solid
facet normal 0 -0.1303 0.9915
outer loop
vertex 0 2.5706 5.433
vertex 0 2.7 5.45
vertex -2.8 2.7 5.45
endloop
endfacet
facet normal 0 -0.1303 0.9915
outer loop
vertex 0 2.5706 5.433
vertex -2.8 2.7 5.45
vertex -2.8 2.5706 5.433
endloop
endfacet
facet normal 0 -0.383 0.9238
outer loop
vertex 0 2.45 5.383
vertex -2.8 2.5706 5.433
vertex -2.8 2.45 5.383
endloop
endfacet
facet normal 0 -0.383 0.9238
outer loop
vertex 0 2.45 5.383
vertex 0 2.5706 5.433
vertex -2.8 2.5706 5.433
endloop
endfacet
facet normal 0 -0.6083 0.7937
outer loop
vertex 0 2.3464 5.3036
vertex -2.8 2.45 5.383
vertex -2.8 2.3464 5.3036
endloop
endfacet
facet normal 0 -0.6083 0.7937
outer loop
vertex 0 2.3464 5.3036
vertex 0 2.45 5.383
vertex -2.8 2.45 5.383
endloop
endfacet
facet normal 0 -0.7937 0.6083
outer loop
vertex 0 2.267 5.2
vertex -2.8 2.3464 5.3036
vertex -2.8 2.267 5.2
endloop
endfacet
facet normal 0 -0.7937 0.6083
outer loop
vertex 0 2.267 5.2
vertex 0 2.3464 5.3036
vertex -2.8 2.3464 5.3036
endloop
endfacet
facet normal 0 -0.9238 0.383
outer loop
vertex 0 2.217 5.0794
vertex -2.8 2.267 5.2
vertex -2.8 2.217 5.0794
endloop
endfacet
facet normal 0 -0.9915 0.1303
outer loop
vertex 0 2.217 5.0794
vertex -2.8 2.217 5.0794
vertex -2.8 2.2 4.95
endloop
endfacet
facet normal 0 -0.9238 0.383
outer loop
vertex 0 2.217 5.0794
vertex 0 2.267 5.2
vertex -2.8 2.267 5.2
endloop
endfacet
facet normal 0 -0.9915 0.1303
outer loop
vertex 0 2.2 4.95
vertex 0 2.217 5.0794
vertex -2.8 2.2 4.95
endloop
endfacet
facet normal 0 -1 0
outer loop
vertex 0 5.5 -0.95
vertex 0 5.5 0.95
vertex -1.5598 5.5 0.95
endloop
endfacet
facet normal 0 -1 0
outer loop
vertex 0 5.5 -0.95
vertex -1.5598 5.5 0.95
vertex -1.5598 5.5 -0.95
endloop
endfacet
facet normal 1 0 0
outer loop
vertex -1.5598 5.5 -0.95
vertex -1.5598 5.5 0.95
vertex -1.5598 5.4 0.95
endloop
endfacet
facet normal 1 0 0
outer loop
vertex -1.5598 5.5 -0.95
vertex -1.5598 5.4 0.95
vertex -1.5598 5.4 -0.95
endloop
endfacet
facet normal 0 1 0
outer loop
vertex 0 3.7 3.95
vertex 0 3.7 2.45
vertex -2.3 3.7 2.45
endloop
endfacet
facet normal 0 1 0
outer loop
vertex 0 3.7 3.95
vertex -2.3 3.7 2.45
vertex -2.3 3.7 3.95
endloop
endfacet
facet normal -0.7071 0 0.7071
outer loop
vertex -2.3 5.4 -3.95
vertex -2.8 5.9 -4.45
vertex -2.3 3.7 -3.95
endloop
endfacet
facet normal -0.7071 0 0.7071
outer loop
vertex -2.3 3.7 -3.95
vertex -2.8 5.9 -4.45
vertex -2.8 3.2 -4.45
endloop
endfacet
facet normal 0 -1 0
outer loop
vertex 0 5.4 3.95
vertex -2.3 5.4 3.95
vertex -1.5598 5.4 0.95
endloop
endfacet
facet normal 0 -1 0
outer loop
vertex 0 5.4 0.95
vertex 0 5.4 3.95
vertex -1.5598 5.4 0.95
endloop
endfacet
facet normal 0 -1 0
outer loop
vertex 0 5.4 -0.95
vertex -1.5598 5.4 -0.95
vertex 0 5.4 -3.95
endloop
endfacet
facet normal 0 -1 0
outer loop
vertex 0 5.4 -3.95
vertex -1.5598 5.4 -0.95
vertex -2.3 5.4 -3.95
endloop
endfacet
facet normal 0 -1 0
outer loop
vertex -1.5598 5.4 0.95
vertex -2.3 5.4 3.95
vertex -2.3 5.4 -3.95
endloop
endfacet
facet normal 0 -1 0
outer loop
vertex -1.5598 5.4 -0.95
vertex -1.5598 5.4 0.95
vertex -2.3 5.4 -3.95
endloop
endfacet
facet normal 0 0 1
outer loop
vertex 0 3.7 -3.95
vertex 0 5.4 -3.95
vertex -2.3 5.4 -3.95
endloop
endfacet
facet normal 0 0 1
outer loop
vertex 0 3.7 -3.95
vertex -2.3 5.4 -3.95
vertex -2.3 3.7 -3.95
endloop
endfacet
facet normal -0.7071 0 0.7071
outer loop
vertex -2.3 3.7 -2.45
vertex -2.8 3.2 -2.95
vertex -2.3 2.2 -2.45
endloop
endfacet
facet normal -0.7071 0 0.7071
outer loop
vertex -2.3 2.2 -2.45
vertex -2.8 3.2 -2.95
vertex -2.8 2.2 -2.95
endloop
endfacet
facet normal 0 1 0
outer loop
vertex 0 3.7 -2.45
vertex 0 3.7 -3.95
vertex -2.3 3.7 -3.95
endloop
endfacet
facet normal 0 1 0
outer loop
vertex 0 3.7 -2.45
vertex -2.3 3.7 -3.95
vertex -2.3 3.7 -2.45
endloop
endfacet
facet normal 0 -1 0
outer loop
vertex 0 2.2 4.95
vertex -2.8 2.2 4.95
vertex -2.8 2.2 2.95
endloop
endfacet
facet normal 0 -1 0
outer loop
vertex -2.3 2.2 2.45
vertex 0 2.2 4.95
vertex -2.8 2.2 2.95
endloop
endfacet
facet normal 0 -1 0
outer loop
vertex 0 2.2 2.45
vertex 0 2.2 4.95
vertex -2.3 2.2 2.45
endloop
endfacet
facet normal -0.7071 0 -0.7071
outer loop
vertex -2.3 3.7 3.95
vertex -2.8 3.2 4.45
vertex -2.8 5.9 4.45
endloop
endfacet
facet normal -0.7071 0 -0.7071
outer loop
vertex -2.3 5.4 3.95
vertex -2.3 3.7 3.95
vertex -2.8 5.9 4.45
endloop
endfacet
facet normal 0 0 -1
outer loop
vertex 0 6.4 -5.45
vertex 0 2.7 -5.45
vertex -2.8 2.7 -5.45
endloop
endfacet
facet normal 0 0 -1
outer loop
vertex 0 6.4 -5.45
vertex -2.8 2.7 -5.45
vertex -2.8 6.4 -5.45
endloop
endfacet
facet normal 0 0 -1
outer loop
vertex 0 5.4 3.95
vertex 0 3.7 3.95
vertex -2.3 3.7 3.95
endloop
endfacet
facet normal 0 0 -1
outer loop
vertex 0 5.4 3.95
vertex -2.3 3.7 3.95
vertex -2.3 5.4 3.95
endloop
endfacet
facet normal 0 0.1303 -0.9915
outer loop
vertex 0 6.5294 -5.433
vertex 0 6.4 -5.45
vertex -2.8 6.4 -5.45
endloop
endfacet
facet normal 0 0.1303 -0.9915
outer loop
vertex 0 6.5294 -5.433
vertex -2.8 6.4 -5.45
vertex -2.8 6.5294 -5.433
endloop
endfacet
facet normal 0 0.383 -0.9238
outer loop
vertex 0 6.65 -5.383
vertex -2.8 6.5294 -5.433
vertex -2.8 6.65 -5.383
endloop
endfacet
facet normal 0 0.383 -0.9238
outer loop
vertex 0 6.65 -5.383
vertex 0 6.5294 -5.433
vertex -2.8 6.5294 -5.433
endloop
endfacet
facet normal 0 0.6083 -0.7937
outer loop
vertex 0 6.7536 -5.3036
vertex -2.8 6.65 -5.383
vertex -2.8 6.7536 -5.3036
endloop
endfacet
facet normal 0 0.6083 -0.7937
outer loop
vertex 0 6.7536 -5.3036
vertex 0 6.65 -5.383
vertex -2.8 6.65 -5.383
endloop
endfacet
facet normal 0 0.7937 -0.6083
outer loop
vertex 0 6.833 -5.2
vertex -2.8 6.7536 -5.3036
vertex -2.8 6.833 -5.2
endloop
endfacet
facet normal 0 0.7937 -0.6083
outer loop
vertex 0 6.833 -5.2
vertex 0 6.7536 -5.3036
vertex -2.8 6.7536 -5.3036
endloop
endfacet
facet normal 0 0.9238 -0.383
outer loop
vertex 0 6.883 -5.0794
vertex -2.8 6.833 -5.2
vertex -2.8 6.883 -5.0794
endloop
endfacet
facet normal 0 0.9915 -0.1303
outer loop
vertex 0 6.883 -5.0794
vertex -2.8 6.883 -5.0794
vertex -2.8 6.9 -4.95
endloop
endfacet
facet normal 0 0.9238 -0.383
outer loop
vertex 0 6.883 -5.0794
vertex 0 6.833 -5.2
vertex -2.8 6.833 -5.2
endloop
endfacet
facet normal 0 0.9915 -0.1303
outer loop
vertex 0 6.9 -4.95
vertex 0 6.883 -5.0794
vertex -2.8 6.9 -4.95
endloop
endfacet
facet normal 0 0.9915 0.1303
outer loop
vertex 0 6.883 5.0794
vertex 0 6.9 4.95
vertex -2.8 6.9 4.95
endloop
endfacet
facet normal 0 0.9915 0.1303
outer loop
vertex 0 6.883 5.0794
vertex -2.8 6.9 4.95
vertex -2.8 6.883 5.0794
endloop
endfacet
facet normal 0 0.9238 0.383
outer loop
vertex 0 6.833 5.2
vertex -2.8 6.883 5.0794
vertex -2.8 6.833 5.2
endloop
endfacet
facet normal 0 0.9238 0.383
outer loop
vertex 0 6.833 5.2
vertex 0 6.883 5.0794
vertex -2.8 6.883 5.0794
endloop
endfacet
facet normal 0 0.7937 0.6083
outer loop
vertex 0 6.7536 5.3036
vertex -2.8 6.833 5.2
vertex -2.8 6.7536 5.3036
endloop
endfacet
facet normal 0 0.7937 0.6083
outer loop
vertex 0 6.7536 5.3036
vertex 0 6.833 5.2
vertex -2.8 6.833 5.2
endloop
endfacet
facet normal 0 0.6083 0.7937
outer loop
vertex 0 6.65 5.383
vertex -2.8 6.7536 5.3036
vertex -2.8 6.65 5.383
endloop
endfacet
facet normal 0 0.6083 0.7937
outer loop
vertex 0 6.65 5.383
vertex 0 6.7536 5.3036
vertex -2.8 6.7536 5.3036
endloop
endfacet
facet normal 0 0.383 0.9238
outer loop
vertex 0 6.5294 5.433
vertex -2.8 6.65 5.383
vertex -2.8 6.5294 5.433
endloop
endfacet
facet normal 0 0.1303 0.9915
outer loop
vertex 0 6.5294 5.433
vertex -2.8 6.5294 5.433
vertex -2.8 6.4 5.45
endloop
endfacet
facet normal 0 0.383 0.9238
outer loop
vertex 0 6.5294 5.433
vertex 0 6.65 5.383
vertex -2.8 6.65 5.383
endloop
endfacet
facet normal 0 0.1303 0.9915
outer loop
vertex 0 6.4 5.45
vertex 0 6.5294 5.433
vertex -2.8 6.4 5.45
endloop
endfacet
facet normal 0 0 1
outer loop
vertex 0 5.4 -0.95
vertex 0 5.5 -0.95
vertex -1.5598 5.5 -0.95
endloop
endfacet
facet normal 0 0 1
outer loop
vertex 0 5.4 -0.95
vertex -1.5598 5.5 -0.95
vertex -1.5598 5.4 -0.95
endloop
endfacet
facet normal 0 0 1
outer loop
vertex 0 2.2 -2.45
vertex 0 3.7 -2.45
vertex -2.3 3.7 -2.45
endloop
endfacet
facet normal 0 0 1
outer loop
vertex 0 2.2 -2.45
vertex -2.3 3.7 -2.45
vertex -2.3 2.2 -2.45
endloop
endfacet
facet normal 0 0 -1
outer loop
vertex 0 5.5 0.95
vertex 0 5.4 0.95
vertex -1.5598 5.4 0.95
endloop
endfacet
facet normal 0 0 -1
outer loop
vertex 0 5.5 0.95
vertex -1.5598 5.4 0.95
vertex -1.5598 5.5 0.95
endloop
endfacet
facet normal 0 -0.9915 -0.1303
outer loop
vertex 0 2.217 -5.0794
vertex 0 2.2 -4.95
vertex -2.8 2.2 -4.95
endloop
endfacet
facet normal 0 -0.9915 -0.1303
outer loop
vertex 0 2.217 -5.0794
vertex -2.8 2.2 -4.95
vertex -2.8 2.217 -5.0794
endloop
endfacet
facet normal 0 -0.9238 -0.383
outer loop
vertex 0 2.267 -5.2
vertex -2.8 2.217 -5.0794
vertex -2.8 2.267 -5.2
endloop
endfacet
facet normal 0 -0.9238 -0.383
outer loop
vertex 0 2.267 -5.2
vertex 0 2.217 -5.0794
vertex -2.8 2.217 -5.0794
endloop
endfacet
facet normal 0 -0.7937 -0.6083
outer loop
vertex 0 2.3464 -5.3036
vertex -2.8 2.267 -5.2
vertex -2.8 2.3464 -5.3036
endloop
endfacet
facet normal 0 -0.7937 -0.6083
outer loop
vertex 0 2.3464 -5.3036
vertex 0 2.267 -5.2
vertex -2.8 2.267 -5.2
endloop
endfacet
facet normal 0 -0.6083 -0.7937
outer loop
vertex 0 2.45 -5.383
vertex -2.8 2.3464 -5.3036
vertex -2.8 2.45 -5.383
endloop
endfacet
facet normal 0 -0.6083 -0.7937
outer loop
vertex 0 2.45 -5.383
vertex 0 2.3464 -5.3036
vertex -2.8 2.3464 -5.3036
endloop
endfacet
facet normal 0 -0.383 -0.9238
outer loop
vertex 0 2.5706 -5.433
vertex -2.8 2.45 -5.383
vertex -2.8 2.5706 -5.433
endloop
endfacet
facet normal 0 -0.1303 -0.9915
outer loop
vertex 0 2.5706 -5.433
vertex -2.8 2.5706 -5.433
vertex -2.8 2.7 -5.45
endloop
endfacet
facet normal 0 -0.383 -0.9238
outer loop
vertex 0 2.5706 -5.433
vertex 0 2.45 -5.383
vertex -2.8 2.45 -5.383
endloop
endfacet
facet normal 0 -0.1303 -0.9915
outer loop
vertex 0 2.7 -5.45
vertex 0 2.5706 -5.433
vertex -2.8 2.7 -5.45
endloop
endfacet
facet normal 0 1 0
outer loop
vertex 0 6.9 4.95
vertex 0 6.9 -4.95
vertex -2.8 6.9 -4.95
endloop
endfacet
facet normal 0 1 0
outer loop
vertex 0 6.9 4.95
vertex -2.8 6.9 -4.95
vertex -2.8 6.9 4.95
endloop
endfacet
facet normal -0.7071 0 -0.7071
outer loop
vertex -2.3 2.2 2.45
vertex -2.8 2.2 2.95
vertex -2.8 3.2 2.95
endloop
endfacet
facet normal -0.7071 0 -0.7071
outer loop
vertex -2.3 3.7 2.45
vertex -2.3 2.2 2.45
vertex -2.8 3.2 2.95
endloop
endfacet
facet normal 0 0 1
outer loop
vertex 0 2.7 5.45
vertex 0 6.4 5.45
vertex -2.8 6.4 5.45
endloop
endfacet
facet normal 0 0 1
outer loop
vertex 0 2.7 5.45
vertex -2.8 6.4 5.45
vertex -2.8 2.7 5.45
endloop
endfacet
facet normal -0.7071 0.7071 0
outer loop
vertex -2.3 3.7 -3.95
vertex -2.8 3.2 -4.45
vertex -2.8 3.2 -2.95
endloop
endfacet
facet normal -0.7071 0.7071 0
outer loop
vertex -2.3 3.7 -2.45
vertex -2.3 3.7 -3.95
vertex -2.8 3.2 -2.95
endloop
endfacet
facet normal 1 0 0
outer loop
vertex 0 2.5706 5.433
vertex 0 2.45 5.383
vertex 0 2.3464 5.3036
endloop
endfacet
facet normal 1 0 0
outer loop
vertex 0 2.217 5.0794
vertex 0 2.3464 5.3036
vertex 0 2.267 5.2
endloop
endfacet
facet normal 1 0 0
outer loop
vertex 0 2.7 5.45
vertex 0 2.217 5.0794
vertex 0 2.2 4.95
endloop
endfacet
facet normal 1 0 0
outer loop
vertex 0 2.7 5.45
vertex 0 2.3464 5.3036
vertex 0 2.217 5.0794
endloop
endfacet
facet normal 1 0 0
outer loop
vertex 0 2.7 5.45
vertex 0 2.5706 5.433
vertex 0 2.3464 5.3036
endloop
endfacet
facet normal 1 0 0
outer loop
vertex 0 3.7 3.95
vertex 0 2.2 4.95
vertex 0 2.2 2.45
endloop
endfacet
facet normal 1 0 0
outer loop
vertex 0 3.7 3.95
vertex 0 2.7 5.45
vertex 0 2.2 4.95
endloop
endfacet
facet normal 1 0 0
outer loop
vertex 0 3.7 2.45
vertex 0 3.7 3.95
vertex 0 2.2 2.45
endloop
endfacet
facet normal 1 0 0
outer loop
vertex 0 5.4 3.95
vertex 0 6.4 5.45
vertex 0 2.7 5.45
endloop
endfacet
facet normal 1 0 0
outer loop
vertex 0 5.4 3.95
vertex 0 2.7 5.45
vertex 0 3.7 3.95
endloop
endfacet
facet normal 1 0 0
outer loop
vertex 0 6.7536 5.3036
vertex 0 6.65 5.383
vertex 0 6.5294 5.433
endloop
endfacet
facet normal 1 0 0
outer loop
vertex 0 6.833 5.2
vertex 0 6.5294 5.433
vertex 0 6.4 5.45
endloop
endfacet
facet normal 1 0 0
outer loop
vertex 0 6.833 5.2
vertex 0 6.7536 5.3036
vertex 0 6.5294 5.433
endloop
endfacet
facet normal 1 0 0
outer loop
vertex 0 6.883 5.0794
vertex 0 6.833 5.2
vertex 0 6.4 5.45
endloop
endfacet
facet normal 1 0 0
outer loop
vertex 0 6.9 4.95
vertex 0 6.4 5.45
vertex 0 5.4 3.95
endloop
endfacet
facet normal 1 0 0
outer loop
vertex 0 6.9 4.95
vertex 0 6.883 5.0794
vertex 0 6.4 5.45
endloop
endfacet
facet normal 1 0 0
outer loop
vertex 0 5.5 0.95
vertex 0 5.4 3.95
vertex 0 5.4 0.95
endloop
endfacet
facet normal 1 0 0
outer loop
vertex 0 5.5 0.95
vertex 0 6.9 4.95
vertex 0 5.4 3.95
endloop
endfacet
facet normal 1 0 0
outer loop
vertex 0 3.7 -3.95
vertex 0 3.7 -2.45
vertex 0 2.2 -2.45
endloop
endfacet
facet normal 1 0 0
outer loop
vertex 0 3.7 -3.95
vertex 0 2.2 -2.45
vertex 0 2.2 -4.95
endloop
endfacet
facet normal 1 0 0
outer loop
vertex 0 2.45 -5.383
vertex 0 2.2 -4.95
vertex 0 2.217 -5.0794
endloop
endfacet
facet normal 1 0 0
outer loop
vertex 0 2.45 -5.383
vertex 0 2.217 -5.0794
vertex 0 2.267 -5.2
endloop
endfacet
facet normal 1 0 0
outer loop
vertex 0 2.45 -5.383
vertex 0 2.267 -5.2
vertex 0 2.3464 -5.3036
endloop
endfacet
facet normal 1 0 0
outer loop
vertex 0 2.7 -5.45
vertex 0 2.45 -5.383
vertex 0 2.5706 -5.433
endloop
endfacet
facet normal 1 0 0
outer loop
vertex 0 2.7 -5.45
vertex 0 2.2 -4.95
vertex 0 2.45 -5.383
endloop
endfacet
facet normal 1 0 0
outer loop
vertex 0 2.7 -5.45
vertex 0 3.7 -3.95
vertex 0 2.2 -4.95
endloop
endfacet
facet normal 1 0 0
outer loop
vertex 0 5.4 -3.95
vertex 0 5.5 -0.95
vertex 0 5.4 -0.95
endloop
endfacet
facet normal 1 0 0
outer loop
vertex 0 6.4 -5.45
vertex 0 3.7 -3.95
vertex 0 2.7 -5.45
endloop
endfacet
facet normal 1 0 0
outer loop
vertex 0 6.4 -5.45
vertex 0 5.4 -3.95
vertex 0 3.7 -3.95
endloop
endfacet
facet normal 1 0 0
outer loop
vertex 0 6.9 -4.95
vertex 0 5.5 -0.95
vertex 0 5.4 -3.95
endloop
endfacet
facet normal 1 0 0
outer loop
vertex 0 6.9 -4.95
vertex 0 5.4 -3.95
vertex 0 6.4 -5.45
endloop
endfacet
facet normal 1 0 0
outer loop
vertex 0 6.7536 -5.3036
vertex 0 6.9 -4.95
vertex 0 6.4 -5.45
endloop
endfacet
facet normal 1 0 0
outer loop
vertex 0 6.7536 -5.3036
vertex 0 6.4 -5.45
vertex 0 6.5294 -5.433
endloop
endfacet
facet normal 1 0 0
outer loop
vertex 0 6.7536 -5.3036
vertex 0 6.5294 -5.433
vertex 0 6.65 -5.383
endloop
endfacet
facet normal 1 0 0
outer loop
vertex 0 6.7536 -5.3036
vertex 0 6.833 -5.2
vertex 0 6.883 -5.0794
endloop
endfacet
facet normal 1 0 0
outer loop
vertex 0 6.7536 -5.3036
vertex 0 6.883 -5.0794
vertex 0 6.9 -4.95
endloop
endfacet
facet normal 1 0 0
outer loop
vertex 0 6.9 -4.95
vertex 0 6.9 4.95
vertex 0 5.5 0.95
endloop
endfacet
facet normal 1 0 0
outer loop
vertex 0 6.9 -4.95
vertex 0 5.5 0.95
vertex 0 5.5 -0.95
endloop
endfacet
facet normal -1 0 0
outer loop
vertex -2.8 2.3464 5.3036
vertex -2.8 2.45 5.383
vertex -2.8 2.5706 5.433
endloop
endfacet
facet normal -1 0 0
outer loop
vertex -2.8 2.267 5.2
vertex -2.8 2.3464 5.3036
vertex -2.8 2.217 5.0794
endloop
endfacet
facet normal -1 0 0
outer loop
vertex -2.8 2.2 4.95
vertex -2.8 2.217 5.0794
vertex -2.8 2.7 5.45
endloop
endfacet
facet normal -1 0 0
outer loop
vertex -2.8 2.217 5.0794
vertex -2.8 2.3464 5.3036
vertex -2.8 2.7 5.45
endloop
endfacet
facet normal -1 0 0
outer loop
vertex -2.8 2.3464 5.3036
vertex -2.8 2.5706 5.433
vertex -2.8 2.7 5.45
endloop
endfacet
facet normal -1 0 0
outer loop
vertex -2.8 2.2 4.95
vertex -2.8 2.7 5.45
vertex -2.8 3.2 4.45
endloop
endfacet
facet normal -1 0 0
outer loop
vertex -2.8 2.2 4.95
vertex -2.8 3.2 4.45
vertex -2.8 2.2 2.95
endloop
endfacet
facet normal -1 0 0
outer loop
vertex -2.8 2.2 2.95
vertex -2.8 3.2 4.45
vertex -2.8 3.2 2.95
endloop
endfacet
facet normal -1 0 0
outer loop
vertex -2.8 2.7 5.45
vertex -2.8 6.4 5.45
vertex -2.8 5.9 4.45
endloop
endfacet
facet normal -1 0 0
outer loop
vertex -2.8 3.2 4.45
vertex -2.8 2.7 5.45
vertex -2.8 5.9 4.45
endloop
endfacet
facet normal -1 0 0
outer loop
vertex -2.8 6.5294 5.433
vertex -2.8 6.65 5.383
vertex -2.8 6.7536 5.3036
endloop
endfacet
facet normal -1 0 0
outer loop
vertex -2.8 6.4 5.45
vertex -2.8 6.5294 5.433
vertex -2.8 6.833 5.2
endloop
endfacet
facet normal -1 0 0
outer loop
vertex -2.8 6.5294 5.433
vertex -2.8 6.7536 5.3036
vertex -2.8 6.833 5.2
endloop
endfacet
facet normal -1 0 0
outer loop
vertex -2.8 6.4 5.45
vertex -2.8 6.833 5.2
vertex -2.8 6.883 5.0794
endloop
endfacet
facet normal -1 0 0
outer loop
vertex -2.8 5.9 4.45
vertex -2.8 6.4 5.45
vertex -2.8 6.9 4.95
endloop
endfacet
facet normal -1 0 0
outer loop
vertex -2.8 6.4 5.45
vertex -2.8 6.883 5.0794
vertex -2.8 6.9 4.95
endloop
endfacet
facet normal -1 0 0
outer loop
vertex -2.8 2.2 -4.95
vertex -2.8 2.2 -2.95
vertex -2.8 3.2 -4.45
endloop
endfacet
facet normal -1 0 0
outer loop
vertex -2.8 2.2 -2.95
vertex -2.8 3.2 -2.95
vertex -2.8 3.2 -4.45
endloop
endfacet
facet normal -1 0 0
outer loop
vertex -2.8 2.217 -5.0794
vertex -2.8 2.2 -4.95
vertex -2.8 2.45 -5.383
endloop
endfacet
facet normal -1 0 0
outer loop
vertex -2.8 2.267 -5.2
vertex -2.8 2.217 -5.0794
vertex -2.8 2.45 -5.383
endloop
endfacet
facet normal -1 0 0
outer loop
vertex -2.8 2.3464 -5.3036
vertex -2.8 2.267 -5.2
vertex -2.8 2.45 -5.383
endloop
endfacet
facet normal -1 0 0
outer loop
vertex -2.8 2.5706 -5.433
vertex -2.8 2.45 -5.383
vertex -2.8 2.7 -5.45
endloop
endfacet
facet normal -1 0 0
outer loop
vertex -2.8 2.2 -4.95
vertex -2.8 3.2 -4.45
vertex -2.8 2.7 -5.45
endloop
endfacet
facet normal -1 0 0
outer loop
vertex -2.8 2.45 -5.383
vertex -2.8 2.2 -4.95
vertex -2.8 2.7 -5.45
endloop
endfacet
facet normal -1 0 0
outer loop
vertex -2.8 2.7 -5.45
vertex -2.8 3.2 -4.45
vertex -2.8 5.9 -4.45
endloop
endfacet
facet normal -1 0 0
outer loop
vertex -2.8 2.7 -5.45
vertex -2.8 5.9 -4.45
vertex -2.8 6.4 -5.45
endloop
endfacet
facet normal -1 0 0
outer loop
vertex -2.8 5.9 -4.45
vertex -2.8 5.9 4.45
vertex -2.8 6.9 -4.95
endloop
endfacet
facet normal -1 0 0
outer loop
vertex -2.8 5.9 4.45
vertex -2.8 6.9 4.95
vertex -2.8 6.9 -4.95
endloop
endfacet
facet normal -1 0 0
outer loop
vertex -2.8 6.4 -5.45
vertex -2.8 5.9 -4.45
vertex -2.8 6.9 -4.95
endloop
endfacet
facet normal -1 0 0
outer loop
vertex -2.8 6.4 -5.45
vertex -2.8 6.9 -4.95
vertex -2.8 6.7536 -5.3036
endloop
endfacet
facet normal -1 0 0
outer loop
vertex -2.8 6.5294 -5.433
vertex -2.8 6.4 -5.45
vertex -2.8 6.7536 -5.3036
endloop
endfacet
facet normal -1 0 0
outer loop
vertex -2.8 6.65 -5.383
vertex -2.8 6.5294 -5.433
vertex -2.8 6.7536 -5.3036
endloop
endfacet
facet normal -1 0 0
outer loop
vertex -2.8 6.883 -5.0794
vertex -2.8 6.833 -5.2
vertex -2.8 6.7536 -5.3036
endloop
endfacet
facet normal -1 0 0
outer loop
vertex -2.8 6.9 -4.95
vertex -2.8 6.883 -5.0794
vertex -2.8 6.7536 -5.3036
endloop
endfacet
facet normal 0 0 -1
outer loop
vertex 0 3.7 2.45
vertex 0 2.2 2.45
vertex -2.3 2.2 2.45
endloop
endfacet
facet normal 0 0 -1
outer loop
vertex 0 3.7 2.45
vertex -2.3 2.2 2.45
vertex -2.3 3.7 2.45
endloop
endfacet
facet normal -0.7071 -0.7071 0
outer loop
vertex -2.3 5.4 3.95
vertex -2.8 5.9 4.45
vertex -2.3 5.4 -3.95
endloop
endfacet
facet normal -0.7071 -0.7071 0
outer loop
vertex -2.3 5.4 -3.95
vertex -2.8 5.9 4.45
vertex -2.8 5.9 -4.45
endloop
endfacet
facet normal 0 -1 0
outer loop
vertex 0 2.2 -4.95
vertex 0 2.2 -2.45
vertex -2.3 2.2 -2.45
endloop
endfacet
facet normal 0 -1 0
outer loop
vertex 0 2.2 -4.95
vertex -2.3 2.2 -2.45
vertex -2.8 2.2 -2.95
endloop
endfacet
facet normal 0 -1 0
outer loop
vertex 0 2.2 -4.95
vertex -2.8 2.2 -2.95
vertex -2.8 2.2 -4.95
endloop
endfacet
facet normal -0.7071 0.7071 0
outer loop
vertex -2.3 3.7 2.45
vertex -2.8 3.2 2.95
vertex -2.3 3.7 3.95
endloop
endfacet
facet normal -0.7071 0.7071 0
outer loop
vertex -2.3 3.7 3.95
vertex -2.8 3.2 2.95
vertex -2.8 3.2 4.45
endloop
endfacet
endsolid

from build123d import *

# Parameters (mm, degrees)
BOSS_EXTRUDE_CLIP_DEPTH       = 2.8
BOSS_EXTRUDE_START            = -2.8
CLIP_OUTLINE_3_W              = 1.9
CLIP_OUTLINE_3_H              = 0.1
BOSS_EXTRUDE_CLIP_NOTCH_DEPTH = 1.240192379
CHAMFER_CLIP_SIZE             = 0.5


with BuildPart() as part:
    # Clip outline → Boss-Extrude clip (new body)
    with BuildSketch(Plane(origin=(0, 0, 0), x_dir=(0, 0, -1), z_dir=(1, 0, 0))):
        with BuildLine():
            Line((-4.95, 2.2), (-2.45, 2.2))
            Line((-2.45, 2.2), (-2.45, 3.7))
            Line((-2.45, 3.7), (-3.95, 3.7))
            Line((-3.95, 3.7), (-3.95, 5.4))
            Line((-3.95, 5.4), (-0.95, 5.4))
            Line((-0.95, 5.4), (-0.95, 5.5))
            Line((-0.95, 5.5), (0.95, 5.5))
            Line((0.95, 5.5), (0.95, 5.4))
            Line((0.95, 5.4), (3.95, 5.4))
            Line((3.95, 5.4), (3.95, 3.7))
            Line((3.95, 3.7), (2.45, 3.7))
            Line((2.45, 3.7), (2.45, 2.2))
            Line((2.45, 2.2), (4.95, 2.2))
            ThreePointArc((4.95, 2.2), (5.303553391, 2.346446609), (5.45, 2.7))
            Line((5.45, 2.7), (5.45, 6.4))
            ThreePointArc((5.45, 6.4), (5.303553391, 6.753553391), (4.95, 6.9))
            Line((4.95, 6.9), (-4.95, 6.9))
            ThreePointArc((-4.95, 6.9), (-5.303553391, 6.753553391), (-5.45, 6.4))
            Line((-5.45, 6.4), (-5.45, 2.7))
            ThreePointArc((-5.45, 2.7), (-5.303553391, 2.346446609), (-4.95, 2.2))
        make_face()
    extrude(amount=-BOSS_EXTRUDE_CLIP_DEPTH)

    # Clip outline<3> → Boss-Extrude clip notch (add)
    with BuildSketch(Plane(origin=(0, 0, 0), x_dir=(0, 0, -1), z_dir=(1, 0, 0)).offset(BOSS_EXTRUDE_START)):
        with Locations((0, 5.45)):
            Rectangle(CLIP_OUTLINE_3_W, CLIP_OUTLINE_3_H)
    extrude(amount=BOSS_EXTRUDE_CLIP_NOTCH_DEPTH)

    # Chamfer clip
    chamfer_clip_edges = [part.edges().sort_by_distance(p)[0] for p in [
        (-2.8, 2.95, 2.45),
        (-2.8, 3.7, 3.2),
        (-2.8, 4.55, 3.95),
        (-2.8, 5.4, 0),
        (-2.8, 4.55, -3.95),
        (-2.8, 3.7, -3.2),
        (-2.8, 2.95, -2.45),
    ]]
    chamfer(chamfer_clip_edges, length=CHAMFER_CLIP_SIZE)


solid = part.part
